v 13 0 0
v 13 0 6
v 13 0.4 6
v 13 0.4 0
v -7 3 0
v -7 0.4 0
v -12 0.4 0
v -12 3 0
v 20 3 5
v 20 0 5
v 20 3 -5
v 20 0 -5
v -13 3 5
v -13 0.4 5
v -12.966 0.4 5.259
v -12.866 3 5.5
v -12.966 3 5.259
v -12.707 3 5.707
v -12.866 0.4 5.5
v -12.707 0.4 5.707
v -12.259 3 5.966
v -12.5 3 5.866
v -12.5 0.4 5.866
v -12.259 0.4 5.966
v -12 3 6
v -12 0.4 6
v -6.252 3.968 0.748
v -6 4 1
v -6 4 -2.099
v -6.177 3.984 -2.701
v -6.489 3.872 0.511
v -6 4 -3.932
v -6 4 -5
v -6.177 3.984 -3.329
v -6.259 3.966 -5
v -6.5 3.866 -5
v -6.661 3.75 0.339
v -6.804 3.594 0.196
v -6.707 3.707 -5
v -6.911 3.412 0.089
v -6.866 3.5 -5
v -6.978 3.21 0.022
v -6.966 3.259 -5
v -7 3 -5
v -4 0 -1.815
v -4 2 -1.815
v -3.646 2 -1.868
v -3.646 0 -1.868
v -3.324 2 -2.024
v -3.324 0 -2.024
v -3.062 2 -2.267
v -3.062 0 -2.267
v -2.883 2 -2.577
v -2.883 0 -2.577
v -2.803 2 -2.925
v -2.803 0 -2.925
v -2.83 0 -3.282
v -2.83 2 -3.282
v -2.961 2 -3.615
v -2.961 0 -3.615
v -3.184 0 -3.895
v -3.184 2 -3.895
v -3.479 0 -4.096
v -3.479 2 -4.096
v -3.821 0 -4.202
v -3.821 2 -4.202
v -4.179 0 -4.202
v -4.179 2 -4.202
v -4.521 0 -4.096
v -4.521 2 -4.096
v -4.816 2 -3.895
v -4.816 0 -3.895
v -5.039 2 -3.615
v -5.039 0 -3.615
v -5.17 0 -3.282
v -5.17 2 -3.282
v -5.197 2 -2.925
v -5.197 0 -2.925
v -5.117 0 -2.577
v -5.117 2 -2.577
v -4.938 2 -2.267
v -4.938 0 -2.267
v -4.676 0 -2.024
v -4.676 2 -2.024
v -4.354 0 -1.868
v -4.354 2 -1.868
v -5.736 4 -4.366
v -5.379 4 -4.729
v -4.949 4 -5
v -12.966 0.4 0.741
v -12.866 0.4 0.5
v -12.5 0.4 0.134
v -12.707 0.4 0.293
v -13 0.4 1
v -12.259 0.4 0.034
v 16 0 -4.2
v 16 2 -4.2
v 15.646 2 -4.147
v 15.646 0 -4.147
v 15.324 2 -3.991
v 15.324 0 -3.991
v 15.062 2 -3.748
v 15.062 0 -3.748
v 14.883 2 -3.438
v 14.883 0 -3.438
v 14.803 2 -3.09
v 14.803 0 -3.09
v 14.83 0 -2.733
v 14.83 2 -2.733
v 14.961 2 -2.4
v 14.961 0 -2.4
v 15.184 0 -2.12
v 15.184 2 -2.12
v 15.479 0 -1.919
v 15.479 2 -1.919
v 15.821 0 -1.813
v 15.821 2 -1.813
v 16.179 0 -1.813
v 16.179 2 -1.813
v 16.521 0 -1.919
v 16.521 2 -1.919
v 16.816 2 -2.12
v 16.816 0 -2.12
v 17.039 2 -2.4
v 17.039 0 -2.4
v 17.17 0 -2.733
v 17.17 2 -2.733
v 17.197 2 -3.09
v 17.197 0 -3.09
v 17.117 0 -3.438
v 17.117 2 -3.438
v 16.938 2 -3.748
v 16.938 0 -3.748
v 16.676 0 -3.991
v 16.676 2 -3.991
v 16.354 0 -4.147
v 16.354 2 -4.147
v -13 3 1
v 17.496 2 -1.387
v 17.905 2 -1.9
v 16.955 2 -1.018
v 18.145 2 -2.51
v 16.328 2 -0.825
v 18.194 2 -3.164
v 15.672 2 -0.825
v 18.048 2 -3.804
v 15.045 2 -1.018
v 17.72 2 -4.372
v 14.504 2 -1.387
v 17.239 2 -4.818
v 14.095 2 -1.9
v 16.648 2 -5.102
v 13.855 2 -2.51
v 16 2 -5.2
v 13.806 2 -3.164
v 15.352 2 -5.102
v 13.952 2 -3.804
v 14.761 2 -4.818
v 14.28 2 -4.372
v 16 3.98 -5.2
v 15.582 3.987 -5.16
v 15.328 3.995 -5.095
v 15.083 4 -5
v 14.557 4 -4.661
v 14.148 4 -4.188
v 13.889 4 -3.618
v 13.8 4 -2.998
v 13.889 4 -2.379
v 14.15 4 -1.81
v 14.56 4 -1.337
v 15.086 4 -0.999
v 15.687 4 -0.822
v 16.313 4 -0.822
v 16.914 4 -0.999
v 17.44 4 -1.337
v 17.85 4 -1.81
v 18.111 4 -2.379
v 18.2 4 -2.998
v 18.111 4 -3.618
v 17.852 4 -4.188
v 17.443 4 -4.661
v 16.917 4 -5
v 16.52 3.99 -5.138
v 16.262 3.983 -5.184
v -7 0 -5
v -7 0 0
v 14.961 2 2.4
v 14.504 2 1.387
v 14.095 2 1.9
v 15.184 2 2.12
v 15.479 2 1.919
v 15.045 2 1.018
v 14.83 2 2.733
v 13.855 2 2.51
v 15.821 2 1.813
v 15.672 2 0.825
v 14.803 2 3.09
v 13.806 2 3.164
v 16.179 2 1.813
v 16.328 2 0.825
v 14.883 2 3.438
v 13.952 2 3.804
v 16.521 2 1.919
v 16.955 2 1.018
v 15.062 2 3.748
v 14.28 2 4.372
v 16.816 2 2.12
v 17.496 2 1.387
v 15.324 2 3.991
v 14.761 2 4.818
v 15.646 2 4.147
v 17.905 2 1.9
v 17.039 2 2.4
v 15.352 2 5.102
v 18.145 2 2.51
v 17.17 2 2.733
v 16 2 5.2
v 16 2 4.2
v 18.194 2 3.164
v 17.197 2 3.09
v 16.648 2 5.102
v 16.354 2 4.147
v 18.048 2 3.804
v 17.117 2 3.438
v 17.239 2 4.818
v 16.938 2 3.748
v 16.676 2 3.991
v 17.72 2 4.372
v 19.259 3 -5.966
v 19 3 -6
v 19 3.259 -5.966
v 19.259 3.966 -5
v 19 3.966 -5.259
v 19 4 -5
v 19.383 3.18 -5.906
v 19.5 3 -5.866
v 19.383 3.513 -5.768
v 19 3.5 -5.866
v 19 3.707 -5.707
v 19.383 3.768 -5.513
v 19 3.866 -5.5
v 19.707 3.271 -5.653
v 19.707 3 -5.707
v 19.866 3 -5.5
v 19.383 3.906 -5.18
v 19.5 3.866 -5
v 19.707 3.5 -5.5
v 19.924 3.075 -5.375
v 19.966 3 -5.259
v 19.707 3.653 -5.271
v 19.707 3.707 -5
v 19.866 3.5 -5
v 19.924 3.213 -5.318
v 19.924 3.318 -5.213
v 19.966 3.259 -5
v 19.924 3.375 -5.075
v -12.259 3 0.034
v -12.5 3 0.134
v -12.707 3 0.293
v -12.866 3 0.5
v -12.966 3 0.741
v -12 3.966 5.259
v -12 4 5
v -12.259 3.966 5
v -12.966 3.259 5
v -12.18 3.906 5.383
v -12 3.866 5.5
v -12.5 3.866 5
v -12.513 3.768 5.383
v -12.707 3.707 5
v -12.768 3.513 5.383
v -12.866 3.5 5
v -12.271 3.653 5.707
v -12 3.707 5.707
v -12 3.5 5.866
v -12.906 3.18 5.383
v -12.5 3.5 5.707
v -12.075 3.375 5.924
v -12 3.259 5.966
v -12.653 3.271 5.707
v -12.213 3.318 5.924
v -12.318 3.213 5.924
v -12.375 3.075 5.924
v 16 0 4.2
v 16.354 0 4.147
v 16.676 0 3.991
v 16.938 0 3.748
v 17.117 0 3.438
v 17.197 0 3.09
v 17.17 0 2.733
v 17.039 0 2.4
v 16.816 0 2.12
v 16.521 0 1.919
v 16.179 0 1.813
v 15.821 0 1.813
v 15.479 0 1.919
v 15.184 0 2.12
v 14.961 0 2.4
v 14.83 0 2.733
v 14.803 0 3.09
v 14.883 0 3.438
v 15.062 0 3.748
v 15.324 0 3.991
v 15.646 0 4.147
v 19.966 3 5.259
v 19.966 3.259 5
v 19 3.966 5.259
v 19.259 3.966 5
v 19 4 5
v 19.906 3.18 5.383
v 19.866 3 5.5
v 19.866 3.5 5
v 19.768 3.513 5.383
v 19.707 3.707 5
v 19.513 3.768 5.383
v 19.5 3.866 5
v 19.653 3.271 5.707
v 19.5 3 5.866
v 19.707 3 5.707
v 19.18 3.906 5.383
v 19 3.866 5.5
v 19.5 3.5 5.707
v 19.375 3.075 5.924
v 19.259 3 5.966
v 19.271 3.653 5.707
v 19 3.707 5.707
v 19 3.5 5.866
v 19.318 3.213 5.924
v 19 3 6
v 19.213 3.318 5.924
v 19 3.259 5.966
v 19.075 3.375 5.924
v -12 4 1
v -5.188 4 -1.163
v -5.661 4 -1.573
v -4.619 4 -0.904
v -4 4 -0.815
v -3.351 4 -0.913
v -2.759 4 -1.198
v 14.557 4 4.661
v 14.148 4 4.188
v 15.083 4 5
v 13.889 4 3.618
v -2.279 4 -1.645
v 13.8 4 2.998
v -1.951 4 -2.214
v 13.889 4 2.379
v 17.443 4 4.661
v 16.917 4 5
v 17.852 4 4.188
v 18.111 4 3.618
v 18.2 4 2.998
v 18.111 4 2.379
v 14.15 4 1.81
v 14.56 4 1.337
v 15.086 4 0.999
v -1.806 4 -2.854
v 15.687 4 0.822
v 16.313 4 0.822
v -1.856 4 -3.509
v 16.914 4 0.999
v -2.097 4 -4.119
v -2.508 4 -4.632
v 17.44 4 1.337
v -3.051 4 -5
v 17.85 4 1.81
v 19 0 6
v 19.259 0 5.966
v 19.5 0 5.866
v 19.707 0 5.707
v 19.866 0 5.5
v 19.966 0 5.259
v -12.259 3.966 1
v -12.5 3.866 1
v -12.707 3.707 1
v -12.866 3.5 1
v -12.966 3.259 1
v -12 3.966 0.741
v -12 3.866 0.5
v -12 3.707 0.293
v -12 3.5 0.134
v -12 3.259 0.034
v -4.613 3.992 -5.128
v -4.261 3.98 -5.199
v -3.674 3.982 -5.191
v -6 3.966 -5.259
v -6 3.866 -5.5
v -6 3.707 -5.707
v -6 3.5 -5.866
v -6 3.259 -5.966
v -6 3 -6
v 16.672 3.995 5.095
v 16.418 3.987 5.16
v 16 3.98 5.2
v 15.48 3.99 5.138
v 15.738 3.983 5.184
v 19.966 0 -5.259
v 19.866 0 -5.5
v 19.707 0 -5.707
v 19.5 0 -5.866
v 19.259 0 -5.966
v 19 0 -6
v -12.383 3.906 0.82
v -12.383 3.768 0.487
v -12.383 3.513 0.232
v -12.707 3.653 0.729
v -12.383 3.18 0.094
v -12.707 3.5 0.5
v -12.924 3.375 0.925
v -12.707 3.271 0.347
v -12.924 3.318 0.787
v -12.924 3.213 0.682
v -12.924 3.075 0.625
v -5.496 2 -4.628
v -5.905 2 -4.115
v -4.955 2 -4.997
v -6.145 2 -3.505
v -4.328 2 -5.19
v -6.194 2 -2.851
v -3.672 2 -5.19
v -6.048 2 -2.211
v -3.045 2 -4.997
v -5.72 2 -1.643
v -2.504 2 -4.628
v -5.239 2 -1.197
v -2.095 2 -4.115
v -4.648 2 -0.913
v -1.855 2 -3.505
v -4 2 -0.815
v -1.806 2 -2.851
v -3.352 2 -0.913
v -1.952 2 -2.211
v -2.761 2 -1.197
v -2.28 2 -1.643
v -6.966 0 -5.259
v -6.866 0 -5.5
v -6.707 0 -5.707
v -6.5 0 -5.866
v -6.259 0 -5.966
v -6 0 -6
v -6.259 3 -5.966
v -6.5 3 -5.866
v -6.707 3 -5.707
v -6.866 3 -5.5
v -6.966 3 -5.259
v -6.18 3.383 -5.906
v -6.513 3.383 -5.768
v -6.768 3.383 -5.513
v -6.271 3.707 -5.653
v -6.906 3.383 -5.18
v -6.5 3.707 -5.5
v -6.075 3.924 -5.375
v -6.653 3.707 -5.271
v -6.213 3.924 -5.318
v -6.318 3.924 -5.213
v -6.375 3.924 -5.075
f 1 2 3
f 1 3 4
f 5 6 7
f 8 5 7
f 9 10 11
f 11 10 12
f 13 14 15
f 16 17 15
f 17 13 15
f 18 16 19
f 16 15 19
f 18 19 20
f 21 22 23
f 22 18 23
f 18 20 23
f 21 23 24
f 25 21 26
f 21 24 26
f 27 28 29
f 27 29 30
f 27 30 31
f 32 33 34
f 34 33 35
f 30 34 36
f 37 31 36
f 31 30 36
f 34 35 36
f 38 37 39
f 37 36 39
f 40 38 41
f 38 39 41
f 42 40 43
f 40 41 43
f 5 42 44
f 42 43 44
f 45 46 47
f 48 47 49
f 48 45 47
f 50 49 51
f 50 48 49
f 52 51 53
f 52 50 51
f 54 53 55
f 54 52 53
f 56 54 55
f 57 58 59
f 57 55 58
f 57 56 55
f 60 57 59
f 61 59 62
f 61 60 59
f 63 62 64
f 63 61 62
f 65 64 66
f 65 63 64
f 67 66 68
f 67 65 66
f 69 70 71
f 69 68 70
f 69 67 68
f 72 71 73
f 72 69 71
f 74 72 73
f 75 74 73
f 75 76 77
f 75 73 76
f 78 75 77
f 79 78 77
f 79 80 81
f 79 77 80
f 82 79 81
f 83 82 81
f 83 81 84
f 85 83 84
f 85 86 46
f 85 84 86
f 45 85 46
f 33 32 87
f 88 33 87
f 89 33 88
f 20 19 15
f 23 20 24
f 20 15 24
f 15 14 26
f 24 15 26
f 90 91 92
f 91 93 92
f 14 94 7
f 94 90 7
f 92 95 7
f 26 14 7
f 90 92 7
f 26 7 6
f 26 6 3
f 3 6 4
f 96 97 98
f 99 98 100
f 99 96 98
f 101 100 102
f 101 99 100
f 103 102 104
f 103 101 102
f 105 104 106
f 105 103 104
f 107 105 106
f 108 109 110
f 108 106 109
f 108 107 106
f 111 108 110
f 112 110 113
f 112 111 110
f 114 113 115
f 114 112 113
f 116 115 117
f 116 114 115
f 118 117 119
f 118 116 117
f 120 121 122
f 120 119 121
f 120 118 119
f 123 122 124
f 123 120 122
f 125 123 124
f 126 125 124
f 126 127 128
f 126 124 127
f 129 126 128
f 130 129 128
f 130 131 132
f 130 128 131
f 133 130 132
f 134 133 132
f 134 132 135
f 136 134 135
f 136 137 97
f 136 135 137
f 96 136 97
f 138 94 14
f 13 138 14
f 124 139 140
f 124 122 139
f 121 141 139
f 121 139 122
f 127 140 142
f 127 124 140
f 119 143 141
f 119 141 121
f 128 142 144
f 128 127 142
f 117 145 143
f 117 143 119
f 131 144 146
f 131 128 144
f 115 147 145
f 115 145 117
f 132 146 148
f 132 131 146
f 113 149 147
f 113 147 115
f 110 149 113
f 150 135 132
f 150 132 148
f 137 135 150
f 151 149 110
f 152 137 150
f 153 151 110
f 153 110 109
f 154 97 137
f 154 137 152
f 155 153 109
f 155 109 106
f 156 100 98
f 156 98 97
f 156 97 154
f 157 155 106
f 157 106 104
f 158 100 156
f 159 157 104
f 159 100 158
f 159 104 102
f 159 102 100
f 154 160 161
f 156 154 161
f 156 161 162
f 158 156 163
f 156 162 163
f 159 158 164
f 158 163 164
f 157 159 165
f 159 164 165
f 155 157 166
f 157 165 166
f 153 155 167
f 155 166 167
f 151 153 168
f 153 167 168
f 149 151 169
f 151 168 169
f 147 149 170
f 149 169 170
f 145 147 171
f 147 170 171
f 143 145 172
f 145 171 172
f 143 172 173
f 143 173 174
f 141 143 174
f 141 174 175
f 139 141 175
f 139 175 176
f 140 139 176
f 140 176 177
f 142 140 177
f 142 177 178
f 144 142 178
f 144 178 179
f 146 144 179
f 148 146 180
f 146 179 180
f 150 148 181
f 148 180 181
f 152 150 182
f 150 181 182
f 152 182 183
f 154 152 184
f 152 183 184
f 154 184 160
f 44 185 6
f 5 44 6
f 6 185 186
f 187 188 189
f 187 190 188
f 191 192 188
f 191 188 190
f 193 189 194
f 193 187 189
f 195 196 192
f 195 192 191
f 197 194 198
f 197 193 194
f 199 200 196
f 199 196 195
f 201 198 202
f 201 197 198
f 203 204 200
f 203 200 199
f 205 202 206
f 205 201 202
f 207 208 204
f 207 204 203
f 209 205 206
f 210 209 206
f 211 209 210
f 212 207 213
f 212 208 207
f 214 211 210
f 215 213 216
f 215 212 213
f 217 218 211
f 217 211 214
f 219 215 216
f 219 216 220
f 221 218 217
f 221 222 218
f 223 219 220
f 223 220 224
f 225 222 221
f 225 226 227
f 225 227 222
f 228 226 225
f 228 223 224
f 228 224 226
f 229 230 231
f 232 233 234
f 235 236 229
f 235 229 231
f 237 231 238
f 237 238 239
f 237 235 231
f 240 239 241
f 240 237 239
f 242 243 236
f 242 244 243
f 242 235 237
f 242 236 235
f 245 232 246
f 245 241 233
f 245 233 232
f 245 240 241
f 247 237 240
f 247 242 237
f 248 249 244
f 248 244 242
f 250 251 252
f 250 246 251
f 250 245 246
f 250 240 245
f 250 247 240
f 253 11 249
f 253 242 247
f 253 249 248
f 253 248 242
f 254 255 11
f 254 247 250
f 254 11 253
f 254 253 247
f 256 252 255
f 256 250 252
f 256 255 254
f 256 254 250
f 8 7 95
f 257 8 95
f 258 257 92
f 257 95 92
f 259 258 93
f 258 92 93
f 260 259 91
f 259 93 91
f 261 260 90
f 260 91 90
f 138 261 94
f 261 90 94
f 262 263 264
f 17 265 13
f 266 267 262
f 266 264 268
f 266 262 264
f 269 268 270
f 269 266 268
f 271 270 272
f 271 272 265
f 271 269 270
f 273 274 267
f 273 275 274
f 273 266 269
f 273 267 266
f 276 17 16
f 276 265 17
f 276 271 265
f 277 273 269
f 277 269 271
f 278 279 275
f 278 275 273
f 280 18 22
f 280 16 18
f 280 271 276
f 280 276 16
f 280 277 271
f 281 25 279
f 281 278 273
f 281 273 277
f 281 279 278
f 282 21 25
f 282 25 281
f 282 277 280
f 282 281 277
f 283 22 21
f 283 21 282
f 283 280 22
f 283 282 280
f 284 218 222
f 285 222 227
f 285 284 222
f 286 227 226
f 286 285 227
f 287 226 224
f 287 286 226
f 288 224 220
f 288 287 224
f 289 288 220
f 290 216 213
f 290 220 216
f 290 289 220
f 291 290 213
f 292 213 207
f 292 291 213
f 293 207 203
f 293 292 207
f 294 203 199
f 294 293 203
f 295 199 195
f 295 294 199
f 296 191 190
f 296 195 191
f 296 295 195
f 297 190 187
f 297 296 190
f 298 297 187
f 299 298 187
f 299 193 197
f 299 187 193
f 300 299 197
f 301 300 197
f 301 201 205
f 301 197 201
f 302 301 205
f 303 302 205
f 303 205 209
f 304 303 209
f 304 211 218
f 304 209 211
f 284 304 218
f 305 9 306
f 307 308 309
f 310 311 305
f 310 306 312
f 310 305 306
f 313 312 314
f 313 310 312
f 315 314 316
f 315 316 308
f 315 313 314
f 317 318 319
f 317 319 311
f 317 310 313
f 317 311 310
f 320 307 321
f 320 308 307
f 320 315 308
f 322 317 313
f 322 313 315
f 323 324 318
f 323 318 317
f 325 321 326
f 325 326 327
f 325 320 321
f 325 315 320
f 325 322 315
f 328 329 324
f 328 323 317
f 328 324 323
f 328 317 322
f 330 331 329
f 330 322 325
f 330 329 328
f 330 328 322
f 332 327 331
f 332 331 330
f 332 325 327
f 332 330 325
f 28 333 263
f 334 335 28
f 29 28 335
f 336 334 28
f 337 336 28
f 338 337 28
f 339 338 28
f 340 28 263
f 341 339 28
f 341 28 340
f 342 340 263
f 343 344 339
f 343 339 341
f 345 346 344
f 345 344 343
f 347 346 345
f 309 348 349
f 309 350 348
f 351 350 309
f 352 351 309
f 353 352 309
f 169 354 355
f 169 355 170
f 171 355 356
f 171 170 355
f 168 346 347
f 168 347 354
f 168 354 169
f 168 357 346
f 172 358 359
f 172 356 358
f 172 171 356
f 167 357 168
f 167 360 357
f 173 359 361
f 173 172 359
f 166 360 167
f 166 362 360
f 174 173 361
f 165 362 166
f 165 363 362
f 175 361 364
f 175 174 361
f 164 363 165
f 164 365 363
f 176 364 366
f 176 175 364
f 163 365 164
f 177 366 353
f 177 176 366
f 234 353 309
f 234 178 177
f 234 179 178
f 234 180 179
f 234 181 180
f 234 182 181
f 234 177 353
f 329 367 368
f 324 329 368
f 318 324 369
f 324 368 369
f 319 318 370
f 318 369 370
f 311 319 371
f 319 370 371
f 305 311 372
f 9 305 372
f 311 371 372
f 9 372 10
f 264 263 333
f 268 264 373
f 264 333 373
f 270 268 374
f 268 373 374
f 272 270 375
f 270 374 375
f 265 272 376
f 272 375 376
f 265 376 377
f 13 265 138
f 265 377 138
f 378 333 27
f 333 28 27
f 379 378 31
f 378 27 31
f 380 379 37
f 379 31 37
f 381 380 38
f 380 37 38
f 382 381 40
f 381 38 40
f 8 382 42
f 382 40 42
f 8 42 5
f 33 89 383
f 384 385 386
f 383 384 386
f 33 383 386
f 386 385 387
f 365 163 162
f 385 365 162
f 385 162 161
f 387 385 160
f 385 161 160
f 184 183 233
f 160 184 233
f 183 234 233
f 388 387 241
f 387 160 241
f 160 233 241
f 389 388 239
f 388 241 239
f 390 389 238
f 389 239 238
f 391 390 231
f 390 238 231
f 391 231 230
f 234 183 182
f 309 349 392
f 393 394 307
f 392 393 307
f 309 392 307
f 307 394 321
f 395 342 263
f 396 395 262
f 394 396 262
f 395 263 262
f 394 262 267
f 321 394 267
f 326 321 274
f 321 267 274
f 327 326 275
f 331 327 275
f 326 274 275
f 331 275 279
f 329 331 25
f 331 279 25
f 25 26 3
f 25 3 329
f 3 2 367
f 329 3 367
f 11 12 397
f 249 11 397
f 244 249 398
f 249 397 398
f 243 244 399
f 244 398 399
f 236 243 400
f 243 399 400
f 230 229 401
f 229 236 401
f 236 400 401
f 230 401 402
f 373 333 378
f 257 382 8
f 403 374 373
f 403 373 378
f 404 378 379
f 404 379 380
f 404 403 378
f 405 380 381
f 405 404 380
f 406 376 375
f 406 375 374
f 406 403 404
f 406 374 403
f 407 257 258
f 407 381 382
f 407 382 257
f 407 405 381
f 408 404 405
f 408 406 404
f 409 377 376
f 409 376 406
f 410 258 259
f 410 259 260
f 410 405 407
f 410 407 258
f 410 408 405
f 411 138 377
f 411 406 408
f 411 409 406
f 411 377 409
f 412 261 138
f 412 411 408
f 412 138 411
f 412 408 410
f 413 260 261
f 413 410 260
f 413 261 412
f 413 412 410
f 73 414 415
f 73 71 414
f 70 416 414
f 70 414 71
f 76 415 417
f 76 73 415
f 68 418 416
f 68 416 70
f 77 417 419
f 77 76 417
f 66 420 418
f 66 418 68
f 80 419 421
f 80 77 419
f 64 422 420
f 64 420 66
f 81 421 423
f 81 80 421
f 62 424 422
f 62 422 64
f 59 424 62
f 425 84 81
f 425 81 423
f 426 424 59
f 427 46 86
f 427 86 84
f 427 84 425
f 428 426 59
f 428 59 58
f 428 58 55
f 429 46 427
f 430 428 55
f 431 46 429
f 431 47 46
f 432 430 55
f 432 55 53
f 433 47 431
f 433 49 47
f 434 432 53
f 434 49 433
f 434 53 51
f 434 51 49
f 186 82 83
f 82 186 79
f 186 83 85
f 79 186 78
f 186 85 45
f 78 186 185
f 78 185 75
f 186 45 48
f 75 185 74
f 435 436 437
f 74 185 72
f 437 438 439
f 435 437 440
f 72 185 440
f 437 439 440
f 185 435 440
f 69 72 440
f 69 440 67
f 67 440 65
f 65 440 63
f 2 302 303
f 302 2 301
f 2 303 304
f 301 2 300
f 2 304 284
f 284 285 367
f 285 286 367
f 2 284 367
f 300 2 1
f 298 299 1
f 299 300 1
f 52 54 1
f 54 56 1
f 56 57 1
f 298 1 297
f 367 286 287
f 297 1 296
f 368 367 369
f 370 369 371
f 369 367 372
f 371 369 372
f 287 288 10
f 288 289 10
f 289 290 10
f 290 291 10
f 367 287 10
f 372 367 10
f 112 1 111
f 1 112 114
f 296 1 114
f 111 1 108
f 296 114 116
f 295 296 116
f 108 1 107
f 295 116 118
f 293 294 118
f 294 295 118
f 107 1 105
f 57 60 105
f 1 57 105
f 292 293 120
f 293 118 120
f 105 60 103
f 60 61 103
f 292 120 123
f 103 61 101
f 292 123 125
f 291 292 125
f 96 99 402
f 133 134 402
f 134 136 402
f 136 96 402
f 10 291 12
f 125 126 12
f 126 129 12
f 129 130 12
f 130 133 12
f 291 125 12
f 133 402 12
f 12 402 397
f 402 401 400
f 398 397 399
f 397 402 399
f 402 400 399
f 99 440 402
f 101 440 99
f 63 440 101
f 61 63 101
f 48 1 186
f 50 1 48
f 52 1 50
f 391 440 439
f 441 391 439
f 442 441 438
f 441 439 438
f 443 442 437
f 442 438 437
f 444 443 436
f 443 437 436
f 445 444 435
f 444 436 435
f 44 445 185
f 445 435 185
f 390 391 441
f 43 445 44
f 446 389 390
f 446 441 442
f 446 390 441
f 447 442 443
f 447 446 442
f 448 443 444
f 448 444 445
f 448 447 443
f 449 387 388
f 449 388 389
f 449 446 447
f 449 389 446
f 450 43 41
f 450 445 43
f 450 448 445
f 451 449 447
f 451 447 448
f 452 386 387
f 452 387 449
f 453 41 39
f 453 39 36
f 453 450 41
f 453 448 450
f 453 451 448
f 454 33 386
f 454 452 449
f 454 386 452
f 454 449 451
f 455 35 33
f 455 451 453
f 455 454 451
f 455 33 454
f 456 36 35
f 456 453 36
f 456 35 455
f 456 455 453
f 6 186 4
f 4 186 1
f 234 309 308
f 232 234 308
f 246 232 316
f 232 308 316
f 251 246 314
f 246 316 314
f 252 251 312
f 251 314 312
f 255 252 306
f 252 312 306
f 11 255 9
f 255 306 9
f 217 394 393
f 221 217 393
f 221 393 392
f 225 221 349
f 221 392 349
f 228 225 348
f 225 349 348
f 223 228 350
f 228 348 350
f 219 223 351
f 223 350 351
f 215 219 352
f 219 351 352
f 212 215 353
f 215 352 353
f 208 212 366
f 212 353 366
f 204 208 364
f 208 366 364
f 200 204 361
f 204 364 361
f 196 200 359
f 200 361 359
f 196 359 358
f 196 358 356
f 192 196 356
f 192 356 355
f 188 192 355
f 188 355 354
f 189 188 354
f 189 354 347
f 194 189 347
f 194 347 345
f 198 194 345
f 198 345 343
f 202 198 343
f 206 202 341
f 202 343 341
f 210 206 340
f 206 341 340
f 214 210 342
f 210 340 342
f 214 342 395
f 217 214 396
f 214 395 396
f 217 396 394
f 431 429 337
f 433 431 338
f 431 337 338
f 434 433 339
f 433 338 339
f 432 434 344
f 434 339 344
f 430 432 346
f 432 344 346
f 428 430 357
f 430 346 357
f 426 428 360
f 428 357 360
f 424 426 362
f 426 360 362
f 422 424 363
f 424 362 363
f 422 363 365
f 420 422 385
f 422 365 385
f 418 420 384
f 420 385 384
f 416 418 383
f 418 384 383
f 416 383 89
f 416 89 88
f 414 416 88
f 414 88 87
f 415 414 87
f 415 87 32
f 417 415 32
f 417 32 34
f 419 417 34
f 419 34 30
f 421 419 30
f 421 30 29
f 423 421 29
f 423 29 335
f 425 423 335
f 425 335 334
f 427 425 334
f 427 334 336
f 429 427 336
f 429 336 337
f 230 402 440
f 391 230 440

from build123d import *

# Parameters (mm, degrees)
EXTRUDE_1_DEPTH     = 4
CUT_EXTRUDE_START   = 4
SKETCH_2_R          = 2.2
CUT_EXTRUDE_2_DEPTH = 2
SKETCH_3_R          = 2.2
CUT_EXTRUDE_3_DEPTH = 2
SKETCH_4_R          = 1.2
CUT_EXTRUDE_4_DEPTH = 22.260291625
SKETCH_5_R          = 1.2
CUT_EXTRUDE_5_DEPTH = 22.260291625
FILLET_1_R          = 1
SKETCH_6_W          = 26
SKETCH_6_H          = 6
CUT_EXTRUDE_8_DEPTH = 0.4


with BuildPart() as part:
    # 草圖1 → 填料-伸長1 (new body)
    with BuildSketch(Plane(origin=(0, 0, 0), x_dir=(1, 0, 0), z_dir=(0, 1, 0))):
        Polygon((-13, -6), (20, -6), (20, 6), (-7, 6), (-7, 0), (-13, 0), align=None)
    extrude(amount=EXTRUDE_1_DEPTH)

    # 草圖2 → 除料-伸長2 (cut)
    with BuildSketch(Plane(origin=(0, 0, 0), x_dir=(1, 0, 0), z_dir=(0, 1, 0)).offset(CUT_EXTRUDE_START)):
        with Locations(Location((-4, 3.015018989, 0), (0, 0, 270))):
            Circle(SKETCH_2_R)
    extrude(amount=-CUT_EXTRUDE_2_DEPTH, mode=Mode.SUBTRACT)

    # 草圖3 → 除料-伸長3 (cut)
    with BuildSketch(Plane(origin=(0, 0, 0), x_dir=(1, 0, 0), z_dir=(0, 1, 0)).offset(CUT_EXTRUDE_START)):
        with Locations(Location((16, -3, 0), (0, 0, 270))):
            Circle(SKETCH_3_R)
        with Locations(Location((16, 3, 0), (0, 0, 90))):
            Circle(SKETCH_3_R)
    extrude(amount=-CUT_EXTRUDE_3_DEPTH, mode=Mode.SUBTRACT)

    # 草圖4 → 除料-伸長4 (cut, through all)
    with BuildSketch(Plane(origin=(0, 0, 0), x_dir=(1, 0, 0), z_dir=(0, 1, 0))):
        with Locations(Location((-4, 3.015018989, 0), (0, 0, 270))):
            Circle(SKETCH_4_R)
        with Locations(Location((16, -3, 0), (0, 0, 270))):
            Circle(SKETCH_4_R)
    extrude(amount=CUT_EXTRUDE_4_DEPTH, mode=Mode.SUBTRACT)

    # 草圖5 → 除料-伸長5 (cut, through all)
    with BuildSketch(Plane(origin=(0, 0, 0), x_dir=(1, 0, 0), z_dir=(0, 1, 0))):
        with Locations(Location((16, 3, 0), (0, 0, 90))):
            Circle(SKETCH_5_R)
    extrude(amount=CUT_EXTRUDE_5_DEPTH, mode=Mode.SUBTRACT)

    # 圓角1
    # the kernel refuses this fillet: 1 mm, written as the material it takes off along each edge
    with BuildSketch(Plane(origin=(19, 3, 5), x_dir=(1, 0, 0), z_dir=(0, 0, 1))) as fillet_1_piece_1_section:
        Polygon((0, 0), (FILLET_1_R, 0), (FILLET_1_R, FILLET_1_R), (0, FILLET_1_R), align=None)
    fillet_1_piece_1 = extrude(amount=FILLET_1_R, mode=Mode.PRIVATE)
    fillet_1_piece_1 = fillet_1_piece_1 - Plane(origin=(19, 3, 5), x_dir=(-0.7071067811865475, -0.7071067811865475, 0), z_dir=(0, 0, 1)) * Sphere(FILLET_1_R, mode=Mode.PRIVATE)
    add(fillet_1_piece_1, mode=Mode.SUBTRACT)
    with BuildSketch(Plane(origin=(19, 3, -5), x_dir=(0, 1, 0), z_dir=(1, 0, 0))) as fillet_1_piece_2_section:
        Polygon((0, 0), (FILLET_1_R, 0), (FILLET_1_R, -FILLET_1_R), (0, -FILLET_1_R), align=None)
    fillet_1_piece_2 = extrude(amount=FILLET_1_R, mode=Mode.PRIVATE)
    fillet_1_piece_2 = fillet_1_piece_2 - Plane(origin=(19, 3, -5), x_dir=(0, -0.7071067811865475, 0.7071067811865475), z_dir=(1, 0, 0)) * Sphere(FILLET_1_R, mode=Mode.PRIVATE)
    add(fillet_1_piece_2, mode=Mode.SUBTRACT)
    with BuildSketch(Plane(origin=(-12, 3, 1), x_dir=(0, 1, 0), z_dir=(-1, 0, 0))) as fillet_1_piece_3_section:
        Polygon((0, 0), (FILLET_1_R, 0), (FILLET_1_R, FILLET_1_R), (0, FILLET_1_R), align=None)
    fillet_1_piece_3 = extrude(amount=FILLET_1_R, mode=Mode.PRIVATE)
    fillet_1_piece_3 = fillet_1_piece_3 - Plane(origin=(-12, 3, 1), x_dir=(0, -0.7071067811865475, 0.7071067811865475), z_dir=(-1, 0, 0)) * Sphere(FILLET_1_R, mode=Mode.PRIVATE)
    add(fillet_1_piece_3, mode=Mode.SUBTRACT)
    with BuildSketch(Plane(origin=(-6, 3, -5), x_dir=(0, 0, -1), z_dir=(0, 1, 0))) as fillet_1_piece_4_section:
        Polygon((0, 0), (FILLET_1_R, 0), (FILLET_1_R, FILLET_1_R), (0, FILLET_1_R), align=None)
    fillet_1_piece_4 = extrude(amount=FILLET_1_R, mode=Mode.PRIVATE)
    fillet_1_piece_4 = fillet_1_piece_4 - Plane(origin=(-6, 3, -5), x_dir=(0.7071067811865475, 0, 0.7071067811865477), z_dir=(0, 1, 0)) * Sphere(FILLET_1_R, mode=Mode.PRIVATE)
    add(fillet_1_piece_4, mode=Mode.SUBTRACT)
    with BuildSketch(Plane(origin=(-12, 3, 5), x_dir=(-1, 0, 0), z_dir=(0, 0, 1))) as fillet_1_piece_5_section:
        Polygon((0, 0), (FILLET_1_R, 0), (FILLET_1_R, -FILLET_1_R), (0, -FILLET_1_R), align=None)
    fillet_1_piece_5 = extrude(amount=FILLET_1_R, mode=Mode.PRIVATE)
    fillet_1_piece_5 = fillet_1_piece_5 - Plane(origin=(-12, 3, 5), x_dir=(0.7071067811865475, -0.7071067811865475, 0), z_dir=(0, 0, 1)) * Sphere(FILLET_1_R, mode=Mode.PRIVATE)
    add(fillet_1_piece_5, mode=Mode.SUBTRACT)
    with BuildSketch(Plane(origin=(20, 4, 5), x_dir=(0, -1, 0), z_dir=(0, 0, -1))) as fillet_1_piece_6:
        with BuildLine():
            CenterArc((FILLET_1_R, FILLET_1_R), FILLET_1_R, 180, 90)
            Line((0, FILLET_1_R), (0, 0))
            Line((0, 0), (FILLET_1_R, 0))
        make_face()
    extrude(amount=10, mode=Mode.SUBTRACT)
    with BuildSketch(Plane(origin=(-13, -2.5, 0), x_dir=(0, 0, 1), z_dir=(0, 1, 0)), Plane(origin=(-13, -2.5, 6), x_dir=(1, 0, 0), z_dir=(0, 1, 0))) as fillet_1_piece_7:
        with BuildLine():
            CenterArc((FILLET_1_R, FILLET_1_R), FILLET_1_R, 180, 90)
            Line((0, FILLET_1_R), (0, 0))
            Line((0, 0), (FILLET_1_R, 0))
        make_face()
    extrude(amount=5.5, mode=Mode.SUBTRACT)
    with BuildSketch(Plane(origin=(-7, -2.5, -6), x_dir=(1, 0, 0), z_dir=(0, 1, 0)), Plane(origin=(20, -2.5, -6), x_dir=(0, 0, 1), z_dir=(0, 1, 0)), Plane(origin=(20, -2.5, 6), x_dir=(-1, 0, 0), z_dir=(0, 1, 0))) as fillet_1_piece_8:
        with BuildLine():
            CenterArc((FILLET_1_R, -FILLET_1_R), FILLET_1_R, 90, 90)
            Line((0, -FILLET_1_R), (0, 0))
            Line((0, 0), (FILLET_1_R, 0))
        make_face()
    extrude(amount=5.5, mode=Mode.SUBTRACT)
    with BuildSketch(Plane(origin=(19, 4, -6), x_dir=(0, 0, 1), z_dir=(-1, 0, 0))) as fillet_1_piece_9:
        with BuildLine():
            CenterArc((FILLET_1_R, -FILLET_1_R), FILLET_1_R, 90, 90)
            Line((0, -FILLET_1_R), (0, 0))
            Line((0, 0), (FILLET_1_R, 0))
        make_face()
    extrude(amount=25, mode=Mode.SUBTRACT)
    with BuildSketch(Plane(origin=(-7, 4, -5), x_dir=(1, 0, 0), z_dir=(0, 0, 1)), Plane(origin=(-7, 4, 0), x_dir=(0, 0, 1), z_dir=(-1, 0, 0))) as fillet_1_piece_10:
        with BuildLine():
            CenterArc((FILLET_1_R, -FILLET_1_R), FILLET_1_R, 90, 90)
            Line((0, -FILLET_1_R), (0, 0))
            Line((0, 0), (FILLET_1_R, 0))
        make_face()
    extrude(amount=5, mode=Mode.SUBTRACT)
    with BuildSketch(Plane(origin=(-13, 4, 1), x_dir=(0, -1, 0), z_dir=(0, 0, 1))) as fillet_1_piece_11:
        with BuildLine():
            CenterArc((FILLET_1_R, FILLET_1_R), FILLET_1_R, 180, 90)
            Line((0, FILLET_1_R), (0, 0))
            Line((0, 0), (FILLET_1_R, 0))
        make_face()
    extrude(amount=4, mode=Mode.SUBTRACT)
    with BuildSketch(Plane(origin=(-12, 4, 6), x_dir=(0, -1, 0), z_dir=(1, 0, 0))) as fillet_1_piece_12:
        with BuildLine():
            CenterArc((FILLET_1_R, FILLET_1_R), FILLET_1_R, 180, 90)
            Line((0, FILLET_1_R), (0, 0))
            Line((0, 0), (FILLET_1_R, 0))
        make_face()
    extrude(amount=31, mode=Mode.SUBTRACT)
    with BuildSketch(Plane(origin=(-4.5, 4, 0), x_dir=(0, 0, 1), z_dir=(-1, 0, 0))) as fillet_1_piece_13a_section:
        with BuildLine():
            CenterArc((FILLET_1_R, -FILLET_1_R), FILLET_1_R, 90, 90)
            Line((0, -FILLET_1_R), (0, 0))
            Line((0, 0), (FILLET_1_R, 0))
        make_face()
    fillet_1_piece_13a = extrude(amount=7.5, mode=Mode.PRIVATE)
    fillet_1_piece_13a = split(fillet_1_piece_13a, bisect_by=Plane(origin=(-7, 3.773604886, 0.226395114), z_dir=(1, 0, 0)), keep=Keep.TOP, mode=Mode.PRIVATE)
    with BuildSketch(Plane(origin=(-7, 4, -5), x_dir=(1, 0, 0), z_dir=(0, 0, 1))) as fillet_1_piece_13b_section:
        with BuildLine():
            CenterArc((FILLET_1_R, -FILLET_1_R), FILLET_1_R, 90, 90)
            Line((0, -FILLET_1_R), (0, 0))
            Line((0, 0), (FILLET_1_R, 0))
        make_face()
    fillet_1_piece_13b = extrude(amount=7.5, mode=Mode.PRIVATE)
    fillet_1_piece_13b = split(fillet_1_piece_13b, bisect_by=Plane(origin=(-6.773604886, 3.773604886, 0), z_dir=(0, 0, 1)), keep=Keep.TOP, mode=Mode.PRIVATE)
    fillet_1_piece_13 = fillet_1_piece_13a & fillet_1_piece_13b
    add(fillet_1_piece_13, mode=Mode.SUBTRACT)

    # 草圖6 → 除料-伸長8 (cut)
    with BuildSketch(Plane(origin=(0, 0, 0), x_dir=(1, 0, 0), z_dir=(0, 1, 0))):
        with Locations((0, -3)):
            Rectangle(SKETCH_6_W, SKETCH_6_H)
    extrude(amount=CUT_EXTRUDE_8_DEPTH, mode=Mode.SUBTRACT)


solid = part.part
